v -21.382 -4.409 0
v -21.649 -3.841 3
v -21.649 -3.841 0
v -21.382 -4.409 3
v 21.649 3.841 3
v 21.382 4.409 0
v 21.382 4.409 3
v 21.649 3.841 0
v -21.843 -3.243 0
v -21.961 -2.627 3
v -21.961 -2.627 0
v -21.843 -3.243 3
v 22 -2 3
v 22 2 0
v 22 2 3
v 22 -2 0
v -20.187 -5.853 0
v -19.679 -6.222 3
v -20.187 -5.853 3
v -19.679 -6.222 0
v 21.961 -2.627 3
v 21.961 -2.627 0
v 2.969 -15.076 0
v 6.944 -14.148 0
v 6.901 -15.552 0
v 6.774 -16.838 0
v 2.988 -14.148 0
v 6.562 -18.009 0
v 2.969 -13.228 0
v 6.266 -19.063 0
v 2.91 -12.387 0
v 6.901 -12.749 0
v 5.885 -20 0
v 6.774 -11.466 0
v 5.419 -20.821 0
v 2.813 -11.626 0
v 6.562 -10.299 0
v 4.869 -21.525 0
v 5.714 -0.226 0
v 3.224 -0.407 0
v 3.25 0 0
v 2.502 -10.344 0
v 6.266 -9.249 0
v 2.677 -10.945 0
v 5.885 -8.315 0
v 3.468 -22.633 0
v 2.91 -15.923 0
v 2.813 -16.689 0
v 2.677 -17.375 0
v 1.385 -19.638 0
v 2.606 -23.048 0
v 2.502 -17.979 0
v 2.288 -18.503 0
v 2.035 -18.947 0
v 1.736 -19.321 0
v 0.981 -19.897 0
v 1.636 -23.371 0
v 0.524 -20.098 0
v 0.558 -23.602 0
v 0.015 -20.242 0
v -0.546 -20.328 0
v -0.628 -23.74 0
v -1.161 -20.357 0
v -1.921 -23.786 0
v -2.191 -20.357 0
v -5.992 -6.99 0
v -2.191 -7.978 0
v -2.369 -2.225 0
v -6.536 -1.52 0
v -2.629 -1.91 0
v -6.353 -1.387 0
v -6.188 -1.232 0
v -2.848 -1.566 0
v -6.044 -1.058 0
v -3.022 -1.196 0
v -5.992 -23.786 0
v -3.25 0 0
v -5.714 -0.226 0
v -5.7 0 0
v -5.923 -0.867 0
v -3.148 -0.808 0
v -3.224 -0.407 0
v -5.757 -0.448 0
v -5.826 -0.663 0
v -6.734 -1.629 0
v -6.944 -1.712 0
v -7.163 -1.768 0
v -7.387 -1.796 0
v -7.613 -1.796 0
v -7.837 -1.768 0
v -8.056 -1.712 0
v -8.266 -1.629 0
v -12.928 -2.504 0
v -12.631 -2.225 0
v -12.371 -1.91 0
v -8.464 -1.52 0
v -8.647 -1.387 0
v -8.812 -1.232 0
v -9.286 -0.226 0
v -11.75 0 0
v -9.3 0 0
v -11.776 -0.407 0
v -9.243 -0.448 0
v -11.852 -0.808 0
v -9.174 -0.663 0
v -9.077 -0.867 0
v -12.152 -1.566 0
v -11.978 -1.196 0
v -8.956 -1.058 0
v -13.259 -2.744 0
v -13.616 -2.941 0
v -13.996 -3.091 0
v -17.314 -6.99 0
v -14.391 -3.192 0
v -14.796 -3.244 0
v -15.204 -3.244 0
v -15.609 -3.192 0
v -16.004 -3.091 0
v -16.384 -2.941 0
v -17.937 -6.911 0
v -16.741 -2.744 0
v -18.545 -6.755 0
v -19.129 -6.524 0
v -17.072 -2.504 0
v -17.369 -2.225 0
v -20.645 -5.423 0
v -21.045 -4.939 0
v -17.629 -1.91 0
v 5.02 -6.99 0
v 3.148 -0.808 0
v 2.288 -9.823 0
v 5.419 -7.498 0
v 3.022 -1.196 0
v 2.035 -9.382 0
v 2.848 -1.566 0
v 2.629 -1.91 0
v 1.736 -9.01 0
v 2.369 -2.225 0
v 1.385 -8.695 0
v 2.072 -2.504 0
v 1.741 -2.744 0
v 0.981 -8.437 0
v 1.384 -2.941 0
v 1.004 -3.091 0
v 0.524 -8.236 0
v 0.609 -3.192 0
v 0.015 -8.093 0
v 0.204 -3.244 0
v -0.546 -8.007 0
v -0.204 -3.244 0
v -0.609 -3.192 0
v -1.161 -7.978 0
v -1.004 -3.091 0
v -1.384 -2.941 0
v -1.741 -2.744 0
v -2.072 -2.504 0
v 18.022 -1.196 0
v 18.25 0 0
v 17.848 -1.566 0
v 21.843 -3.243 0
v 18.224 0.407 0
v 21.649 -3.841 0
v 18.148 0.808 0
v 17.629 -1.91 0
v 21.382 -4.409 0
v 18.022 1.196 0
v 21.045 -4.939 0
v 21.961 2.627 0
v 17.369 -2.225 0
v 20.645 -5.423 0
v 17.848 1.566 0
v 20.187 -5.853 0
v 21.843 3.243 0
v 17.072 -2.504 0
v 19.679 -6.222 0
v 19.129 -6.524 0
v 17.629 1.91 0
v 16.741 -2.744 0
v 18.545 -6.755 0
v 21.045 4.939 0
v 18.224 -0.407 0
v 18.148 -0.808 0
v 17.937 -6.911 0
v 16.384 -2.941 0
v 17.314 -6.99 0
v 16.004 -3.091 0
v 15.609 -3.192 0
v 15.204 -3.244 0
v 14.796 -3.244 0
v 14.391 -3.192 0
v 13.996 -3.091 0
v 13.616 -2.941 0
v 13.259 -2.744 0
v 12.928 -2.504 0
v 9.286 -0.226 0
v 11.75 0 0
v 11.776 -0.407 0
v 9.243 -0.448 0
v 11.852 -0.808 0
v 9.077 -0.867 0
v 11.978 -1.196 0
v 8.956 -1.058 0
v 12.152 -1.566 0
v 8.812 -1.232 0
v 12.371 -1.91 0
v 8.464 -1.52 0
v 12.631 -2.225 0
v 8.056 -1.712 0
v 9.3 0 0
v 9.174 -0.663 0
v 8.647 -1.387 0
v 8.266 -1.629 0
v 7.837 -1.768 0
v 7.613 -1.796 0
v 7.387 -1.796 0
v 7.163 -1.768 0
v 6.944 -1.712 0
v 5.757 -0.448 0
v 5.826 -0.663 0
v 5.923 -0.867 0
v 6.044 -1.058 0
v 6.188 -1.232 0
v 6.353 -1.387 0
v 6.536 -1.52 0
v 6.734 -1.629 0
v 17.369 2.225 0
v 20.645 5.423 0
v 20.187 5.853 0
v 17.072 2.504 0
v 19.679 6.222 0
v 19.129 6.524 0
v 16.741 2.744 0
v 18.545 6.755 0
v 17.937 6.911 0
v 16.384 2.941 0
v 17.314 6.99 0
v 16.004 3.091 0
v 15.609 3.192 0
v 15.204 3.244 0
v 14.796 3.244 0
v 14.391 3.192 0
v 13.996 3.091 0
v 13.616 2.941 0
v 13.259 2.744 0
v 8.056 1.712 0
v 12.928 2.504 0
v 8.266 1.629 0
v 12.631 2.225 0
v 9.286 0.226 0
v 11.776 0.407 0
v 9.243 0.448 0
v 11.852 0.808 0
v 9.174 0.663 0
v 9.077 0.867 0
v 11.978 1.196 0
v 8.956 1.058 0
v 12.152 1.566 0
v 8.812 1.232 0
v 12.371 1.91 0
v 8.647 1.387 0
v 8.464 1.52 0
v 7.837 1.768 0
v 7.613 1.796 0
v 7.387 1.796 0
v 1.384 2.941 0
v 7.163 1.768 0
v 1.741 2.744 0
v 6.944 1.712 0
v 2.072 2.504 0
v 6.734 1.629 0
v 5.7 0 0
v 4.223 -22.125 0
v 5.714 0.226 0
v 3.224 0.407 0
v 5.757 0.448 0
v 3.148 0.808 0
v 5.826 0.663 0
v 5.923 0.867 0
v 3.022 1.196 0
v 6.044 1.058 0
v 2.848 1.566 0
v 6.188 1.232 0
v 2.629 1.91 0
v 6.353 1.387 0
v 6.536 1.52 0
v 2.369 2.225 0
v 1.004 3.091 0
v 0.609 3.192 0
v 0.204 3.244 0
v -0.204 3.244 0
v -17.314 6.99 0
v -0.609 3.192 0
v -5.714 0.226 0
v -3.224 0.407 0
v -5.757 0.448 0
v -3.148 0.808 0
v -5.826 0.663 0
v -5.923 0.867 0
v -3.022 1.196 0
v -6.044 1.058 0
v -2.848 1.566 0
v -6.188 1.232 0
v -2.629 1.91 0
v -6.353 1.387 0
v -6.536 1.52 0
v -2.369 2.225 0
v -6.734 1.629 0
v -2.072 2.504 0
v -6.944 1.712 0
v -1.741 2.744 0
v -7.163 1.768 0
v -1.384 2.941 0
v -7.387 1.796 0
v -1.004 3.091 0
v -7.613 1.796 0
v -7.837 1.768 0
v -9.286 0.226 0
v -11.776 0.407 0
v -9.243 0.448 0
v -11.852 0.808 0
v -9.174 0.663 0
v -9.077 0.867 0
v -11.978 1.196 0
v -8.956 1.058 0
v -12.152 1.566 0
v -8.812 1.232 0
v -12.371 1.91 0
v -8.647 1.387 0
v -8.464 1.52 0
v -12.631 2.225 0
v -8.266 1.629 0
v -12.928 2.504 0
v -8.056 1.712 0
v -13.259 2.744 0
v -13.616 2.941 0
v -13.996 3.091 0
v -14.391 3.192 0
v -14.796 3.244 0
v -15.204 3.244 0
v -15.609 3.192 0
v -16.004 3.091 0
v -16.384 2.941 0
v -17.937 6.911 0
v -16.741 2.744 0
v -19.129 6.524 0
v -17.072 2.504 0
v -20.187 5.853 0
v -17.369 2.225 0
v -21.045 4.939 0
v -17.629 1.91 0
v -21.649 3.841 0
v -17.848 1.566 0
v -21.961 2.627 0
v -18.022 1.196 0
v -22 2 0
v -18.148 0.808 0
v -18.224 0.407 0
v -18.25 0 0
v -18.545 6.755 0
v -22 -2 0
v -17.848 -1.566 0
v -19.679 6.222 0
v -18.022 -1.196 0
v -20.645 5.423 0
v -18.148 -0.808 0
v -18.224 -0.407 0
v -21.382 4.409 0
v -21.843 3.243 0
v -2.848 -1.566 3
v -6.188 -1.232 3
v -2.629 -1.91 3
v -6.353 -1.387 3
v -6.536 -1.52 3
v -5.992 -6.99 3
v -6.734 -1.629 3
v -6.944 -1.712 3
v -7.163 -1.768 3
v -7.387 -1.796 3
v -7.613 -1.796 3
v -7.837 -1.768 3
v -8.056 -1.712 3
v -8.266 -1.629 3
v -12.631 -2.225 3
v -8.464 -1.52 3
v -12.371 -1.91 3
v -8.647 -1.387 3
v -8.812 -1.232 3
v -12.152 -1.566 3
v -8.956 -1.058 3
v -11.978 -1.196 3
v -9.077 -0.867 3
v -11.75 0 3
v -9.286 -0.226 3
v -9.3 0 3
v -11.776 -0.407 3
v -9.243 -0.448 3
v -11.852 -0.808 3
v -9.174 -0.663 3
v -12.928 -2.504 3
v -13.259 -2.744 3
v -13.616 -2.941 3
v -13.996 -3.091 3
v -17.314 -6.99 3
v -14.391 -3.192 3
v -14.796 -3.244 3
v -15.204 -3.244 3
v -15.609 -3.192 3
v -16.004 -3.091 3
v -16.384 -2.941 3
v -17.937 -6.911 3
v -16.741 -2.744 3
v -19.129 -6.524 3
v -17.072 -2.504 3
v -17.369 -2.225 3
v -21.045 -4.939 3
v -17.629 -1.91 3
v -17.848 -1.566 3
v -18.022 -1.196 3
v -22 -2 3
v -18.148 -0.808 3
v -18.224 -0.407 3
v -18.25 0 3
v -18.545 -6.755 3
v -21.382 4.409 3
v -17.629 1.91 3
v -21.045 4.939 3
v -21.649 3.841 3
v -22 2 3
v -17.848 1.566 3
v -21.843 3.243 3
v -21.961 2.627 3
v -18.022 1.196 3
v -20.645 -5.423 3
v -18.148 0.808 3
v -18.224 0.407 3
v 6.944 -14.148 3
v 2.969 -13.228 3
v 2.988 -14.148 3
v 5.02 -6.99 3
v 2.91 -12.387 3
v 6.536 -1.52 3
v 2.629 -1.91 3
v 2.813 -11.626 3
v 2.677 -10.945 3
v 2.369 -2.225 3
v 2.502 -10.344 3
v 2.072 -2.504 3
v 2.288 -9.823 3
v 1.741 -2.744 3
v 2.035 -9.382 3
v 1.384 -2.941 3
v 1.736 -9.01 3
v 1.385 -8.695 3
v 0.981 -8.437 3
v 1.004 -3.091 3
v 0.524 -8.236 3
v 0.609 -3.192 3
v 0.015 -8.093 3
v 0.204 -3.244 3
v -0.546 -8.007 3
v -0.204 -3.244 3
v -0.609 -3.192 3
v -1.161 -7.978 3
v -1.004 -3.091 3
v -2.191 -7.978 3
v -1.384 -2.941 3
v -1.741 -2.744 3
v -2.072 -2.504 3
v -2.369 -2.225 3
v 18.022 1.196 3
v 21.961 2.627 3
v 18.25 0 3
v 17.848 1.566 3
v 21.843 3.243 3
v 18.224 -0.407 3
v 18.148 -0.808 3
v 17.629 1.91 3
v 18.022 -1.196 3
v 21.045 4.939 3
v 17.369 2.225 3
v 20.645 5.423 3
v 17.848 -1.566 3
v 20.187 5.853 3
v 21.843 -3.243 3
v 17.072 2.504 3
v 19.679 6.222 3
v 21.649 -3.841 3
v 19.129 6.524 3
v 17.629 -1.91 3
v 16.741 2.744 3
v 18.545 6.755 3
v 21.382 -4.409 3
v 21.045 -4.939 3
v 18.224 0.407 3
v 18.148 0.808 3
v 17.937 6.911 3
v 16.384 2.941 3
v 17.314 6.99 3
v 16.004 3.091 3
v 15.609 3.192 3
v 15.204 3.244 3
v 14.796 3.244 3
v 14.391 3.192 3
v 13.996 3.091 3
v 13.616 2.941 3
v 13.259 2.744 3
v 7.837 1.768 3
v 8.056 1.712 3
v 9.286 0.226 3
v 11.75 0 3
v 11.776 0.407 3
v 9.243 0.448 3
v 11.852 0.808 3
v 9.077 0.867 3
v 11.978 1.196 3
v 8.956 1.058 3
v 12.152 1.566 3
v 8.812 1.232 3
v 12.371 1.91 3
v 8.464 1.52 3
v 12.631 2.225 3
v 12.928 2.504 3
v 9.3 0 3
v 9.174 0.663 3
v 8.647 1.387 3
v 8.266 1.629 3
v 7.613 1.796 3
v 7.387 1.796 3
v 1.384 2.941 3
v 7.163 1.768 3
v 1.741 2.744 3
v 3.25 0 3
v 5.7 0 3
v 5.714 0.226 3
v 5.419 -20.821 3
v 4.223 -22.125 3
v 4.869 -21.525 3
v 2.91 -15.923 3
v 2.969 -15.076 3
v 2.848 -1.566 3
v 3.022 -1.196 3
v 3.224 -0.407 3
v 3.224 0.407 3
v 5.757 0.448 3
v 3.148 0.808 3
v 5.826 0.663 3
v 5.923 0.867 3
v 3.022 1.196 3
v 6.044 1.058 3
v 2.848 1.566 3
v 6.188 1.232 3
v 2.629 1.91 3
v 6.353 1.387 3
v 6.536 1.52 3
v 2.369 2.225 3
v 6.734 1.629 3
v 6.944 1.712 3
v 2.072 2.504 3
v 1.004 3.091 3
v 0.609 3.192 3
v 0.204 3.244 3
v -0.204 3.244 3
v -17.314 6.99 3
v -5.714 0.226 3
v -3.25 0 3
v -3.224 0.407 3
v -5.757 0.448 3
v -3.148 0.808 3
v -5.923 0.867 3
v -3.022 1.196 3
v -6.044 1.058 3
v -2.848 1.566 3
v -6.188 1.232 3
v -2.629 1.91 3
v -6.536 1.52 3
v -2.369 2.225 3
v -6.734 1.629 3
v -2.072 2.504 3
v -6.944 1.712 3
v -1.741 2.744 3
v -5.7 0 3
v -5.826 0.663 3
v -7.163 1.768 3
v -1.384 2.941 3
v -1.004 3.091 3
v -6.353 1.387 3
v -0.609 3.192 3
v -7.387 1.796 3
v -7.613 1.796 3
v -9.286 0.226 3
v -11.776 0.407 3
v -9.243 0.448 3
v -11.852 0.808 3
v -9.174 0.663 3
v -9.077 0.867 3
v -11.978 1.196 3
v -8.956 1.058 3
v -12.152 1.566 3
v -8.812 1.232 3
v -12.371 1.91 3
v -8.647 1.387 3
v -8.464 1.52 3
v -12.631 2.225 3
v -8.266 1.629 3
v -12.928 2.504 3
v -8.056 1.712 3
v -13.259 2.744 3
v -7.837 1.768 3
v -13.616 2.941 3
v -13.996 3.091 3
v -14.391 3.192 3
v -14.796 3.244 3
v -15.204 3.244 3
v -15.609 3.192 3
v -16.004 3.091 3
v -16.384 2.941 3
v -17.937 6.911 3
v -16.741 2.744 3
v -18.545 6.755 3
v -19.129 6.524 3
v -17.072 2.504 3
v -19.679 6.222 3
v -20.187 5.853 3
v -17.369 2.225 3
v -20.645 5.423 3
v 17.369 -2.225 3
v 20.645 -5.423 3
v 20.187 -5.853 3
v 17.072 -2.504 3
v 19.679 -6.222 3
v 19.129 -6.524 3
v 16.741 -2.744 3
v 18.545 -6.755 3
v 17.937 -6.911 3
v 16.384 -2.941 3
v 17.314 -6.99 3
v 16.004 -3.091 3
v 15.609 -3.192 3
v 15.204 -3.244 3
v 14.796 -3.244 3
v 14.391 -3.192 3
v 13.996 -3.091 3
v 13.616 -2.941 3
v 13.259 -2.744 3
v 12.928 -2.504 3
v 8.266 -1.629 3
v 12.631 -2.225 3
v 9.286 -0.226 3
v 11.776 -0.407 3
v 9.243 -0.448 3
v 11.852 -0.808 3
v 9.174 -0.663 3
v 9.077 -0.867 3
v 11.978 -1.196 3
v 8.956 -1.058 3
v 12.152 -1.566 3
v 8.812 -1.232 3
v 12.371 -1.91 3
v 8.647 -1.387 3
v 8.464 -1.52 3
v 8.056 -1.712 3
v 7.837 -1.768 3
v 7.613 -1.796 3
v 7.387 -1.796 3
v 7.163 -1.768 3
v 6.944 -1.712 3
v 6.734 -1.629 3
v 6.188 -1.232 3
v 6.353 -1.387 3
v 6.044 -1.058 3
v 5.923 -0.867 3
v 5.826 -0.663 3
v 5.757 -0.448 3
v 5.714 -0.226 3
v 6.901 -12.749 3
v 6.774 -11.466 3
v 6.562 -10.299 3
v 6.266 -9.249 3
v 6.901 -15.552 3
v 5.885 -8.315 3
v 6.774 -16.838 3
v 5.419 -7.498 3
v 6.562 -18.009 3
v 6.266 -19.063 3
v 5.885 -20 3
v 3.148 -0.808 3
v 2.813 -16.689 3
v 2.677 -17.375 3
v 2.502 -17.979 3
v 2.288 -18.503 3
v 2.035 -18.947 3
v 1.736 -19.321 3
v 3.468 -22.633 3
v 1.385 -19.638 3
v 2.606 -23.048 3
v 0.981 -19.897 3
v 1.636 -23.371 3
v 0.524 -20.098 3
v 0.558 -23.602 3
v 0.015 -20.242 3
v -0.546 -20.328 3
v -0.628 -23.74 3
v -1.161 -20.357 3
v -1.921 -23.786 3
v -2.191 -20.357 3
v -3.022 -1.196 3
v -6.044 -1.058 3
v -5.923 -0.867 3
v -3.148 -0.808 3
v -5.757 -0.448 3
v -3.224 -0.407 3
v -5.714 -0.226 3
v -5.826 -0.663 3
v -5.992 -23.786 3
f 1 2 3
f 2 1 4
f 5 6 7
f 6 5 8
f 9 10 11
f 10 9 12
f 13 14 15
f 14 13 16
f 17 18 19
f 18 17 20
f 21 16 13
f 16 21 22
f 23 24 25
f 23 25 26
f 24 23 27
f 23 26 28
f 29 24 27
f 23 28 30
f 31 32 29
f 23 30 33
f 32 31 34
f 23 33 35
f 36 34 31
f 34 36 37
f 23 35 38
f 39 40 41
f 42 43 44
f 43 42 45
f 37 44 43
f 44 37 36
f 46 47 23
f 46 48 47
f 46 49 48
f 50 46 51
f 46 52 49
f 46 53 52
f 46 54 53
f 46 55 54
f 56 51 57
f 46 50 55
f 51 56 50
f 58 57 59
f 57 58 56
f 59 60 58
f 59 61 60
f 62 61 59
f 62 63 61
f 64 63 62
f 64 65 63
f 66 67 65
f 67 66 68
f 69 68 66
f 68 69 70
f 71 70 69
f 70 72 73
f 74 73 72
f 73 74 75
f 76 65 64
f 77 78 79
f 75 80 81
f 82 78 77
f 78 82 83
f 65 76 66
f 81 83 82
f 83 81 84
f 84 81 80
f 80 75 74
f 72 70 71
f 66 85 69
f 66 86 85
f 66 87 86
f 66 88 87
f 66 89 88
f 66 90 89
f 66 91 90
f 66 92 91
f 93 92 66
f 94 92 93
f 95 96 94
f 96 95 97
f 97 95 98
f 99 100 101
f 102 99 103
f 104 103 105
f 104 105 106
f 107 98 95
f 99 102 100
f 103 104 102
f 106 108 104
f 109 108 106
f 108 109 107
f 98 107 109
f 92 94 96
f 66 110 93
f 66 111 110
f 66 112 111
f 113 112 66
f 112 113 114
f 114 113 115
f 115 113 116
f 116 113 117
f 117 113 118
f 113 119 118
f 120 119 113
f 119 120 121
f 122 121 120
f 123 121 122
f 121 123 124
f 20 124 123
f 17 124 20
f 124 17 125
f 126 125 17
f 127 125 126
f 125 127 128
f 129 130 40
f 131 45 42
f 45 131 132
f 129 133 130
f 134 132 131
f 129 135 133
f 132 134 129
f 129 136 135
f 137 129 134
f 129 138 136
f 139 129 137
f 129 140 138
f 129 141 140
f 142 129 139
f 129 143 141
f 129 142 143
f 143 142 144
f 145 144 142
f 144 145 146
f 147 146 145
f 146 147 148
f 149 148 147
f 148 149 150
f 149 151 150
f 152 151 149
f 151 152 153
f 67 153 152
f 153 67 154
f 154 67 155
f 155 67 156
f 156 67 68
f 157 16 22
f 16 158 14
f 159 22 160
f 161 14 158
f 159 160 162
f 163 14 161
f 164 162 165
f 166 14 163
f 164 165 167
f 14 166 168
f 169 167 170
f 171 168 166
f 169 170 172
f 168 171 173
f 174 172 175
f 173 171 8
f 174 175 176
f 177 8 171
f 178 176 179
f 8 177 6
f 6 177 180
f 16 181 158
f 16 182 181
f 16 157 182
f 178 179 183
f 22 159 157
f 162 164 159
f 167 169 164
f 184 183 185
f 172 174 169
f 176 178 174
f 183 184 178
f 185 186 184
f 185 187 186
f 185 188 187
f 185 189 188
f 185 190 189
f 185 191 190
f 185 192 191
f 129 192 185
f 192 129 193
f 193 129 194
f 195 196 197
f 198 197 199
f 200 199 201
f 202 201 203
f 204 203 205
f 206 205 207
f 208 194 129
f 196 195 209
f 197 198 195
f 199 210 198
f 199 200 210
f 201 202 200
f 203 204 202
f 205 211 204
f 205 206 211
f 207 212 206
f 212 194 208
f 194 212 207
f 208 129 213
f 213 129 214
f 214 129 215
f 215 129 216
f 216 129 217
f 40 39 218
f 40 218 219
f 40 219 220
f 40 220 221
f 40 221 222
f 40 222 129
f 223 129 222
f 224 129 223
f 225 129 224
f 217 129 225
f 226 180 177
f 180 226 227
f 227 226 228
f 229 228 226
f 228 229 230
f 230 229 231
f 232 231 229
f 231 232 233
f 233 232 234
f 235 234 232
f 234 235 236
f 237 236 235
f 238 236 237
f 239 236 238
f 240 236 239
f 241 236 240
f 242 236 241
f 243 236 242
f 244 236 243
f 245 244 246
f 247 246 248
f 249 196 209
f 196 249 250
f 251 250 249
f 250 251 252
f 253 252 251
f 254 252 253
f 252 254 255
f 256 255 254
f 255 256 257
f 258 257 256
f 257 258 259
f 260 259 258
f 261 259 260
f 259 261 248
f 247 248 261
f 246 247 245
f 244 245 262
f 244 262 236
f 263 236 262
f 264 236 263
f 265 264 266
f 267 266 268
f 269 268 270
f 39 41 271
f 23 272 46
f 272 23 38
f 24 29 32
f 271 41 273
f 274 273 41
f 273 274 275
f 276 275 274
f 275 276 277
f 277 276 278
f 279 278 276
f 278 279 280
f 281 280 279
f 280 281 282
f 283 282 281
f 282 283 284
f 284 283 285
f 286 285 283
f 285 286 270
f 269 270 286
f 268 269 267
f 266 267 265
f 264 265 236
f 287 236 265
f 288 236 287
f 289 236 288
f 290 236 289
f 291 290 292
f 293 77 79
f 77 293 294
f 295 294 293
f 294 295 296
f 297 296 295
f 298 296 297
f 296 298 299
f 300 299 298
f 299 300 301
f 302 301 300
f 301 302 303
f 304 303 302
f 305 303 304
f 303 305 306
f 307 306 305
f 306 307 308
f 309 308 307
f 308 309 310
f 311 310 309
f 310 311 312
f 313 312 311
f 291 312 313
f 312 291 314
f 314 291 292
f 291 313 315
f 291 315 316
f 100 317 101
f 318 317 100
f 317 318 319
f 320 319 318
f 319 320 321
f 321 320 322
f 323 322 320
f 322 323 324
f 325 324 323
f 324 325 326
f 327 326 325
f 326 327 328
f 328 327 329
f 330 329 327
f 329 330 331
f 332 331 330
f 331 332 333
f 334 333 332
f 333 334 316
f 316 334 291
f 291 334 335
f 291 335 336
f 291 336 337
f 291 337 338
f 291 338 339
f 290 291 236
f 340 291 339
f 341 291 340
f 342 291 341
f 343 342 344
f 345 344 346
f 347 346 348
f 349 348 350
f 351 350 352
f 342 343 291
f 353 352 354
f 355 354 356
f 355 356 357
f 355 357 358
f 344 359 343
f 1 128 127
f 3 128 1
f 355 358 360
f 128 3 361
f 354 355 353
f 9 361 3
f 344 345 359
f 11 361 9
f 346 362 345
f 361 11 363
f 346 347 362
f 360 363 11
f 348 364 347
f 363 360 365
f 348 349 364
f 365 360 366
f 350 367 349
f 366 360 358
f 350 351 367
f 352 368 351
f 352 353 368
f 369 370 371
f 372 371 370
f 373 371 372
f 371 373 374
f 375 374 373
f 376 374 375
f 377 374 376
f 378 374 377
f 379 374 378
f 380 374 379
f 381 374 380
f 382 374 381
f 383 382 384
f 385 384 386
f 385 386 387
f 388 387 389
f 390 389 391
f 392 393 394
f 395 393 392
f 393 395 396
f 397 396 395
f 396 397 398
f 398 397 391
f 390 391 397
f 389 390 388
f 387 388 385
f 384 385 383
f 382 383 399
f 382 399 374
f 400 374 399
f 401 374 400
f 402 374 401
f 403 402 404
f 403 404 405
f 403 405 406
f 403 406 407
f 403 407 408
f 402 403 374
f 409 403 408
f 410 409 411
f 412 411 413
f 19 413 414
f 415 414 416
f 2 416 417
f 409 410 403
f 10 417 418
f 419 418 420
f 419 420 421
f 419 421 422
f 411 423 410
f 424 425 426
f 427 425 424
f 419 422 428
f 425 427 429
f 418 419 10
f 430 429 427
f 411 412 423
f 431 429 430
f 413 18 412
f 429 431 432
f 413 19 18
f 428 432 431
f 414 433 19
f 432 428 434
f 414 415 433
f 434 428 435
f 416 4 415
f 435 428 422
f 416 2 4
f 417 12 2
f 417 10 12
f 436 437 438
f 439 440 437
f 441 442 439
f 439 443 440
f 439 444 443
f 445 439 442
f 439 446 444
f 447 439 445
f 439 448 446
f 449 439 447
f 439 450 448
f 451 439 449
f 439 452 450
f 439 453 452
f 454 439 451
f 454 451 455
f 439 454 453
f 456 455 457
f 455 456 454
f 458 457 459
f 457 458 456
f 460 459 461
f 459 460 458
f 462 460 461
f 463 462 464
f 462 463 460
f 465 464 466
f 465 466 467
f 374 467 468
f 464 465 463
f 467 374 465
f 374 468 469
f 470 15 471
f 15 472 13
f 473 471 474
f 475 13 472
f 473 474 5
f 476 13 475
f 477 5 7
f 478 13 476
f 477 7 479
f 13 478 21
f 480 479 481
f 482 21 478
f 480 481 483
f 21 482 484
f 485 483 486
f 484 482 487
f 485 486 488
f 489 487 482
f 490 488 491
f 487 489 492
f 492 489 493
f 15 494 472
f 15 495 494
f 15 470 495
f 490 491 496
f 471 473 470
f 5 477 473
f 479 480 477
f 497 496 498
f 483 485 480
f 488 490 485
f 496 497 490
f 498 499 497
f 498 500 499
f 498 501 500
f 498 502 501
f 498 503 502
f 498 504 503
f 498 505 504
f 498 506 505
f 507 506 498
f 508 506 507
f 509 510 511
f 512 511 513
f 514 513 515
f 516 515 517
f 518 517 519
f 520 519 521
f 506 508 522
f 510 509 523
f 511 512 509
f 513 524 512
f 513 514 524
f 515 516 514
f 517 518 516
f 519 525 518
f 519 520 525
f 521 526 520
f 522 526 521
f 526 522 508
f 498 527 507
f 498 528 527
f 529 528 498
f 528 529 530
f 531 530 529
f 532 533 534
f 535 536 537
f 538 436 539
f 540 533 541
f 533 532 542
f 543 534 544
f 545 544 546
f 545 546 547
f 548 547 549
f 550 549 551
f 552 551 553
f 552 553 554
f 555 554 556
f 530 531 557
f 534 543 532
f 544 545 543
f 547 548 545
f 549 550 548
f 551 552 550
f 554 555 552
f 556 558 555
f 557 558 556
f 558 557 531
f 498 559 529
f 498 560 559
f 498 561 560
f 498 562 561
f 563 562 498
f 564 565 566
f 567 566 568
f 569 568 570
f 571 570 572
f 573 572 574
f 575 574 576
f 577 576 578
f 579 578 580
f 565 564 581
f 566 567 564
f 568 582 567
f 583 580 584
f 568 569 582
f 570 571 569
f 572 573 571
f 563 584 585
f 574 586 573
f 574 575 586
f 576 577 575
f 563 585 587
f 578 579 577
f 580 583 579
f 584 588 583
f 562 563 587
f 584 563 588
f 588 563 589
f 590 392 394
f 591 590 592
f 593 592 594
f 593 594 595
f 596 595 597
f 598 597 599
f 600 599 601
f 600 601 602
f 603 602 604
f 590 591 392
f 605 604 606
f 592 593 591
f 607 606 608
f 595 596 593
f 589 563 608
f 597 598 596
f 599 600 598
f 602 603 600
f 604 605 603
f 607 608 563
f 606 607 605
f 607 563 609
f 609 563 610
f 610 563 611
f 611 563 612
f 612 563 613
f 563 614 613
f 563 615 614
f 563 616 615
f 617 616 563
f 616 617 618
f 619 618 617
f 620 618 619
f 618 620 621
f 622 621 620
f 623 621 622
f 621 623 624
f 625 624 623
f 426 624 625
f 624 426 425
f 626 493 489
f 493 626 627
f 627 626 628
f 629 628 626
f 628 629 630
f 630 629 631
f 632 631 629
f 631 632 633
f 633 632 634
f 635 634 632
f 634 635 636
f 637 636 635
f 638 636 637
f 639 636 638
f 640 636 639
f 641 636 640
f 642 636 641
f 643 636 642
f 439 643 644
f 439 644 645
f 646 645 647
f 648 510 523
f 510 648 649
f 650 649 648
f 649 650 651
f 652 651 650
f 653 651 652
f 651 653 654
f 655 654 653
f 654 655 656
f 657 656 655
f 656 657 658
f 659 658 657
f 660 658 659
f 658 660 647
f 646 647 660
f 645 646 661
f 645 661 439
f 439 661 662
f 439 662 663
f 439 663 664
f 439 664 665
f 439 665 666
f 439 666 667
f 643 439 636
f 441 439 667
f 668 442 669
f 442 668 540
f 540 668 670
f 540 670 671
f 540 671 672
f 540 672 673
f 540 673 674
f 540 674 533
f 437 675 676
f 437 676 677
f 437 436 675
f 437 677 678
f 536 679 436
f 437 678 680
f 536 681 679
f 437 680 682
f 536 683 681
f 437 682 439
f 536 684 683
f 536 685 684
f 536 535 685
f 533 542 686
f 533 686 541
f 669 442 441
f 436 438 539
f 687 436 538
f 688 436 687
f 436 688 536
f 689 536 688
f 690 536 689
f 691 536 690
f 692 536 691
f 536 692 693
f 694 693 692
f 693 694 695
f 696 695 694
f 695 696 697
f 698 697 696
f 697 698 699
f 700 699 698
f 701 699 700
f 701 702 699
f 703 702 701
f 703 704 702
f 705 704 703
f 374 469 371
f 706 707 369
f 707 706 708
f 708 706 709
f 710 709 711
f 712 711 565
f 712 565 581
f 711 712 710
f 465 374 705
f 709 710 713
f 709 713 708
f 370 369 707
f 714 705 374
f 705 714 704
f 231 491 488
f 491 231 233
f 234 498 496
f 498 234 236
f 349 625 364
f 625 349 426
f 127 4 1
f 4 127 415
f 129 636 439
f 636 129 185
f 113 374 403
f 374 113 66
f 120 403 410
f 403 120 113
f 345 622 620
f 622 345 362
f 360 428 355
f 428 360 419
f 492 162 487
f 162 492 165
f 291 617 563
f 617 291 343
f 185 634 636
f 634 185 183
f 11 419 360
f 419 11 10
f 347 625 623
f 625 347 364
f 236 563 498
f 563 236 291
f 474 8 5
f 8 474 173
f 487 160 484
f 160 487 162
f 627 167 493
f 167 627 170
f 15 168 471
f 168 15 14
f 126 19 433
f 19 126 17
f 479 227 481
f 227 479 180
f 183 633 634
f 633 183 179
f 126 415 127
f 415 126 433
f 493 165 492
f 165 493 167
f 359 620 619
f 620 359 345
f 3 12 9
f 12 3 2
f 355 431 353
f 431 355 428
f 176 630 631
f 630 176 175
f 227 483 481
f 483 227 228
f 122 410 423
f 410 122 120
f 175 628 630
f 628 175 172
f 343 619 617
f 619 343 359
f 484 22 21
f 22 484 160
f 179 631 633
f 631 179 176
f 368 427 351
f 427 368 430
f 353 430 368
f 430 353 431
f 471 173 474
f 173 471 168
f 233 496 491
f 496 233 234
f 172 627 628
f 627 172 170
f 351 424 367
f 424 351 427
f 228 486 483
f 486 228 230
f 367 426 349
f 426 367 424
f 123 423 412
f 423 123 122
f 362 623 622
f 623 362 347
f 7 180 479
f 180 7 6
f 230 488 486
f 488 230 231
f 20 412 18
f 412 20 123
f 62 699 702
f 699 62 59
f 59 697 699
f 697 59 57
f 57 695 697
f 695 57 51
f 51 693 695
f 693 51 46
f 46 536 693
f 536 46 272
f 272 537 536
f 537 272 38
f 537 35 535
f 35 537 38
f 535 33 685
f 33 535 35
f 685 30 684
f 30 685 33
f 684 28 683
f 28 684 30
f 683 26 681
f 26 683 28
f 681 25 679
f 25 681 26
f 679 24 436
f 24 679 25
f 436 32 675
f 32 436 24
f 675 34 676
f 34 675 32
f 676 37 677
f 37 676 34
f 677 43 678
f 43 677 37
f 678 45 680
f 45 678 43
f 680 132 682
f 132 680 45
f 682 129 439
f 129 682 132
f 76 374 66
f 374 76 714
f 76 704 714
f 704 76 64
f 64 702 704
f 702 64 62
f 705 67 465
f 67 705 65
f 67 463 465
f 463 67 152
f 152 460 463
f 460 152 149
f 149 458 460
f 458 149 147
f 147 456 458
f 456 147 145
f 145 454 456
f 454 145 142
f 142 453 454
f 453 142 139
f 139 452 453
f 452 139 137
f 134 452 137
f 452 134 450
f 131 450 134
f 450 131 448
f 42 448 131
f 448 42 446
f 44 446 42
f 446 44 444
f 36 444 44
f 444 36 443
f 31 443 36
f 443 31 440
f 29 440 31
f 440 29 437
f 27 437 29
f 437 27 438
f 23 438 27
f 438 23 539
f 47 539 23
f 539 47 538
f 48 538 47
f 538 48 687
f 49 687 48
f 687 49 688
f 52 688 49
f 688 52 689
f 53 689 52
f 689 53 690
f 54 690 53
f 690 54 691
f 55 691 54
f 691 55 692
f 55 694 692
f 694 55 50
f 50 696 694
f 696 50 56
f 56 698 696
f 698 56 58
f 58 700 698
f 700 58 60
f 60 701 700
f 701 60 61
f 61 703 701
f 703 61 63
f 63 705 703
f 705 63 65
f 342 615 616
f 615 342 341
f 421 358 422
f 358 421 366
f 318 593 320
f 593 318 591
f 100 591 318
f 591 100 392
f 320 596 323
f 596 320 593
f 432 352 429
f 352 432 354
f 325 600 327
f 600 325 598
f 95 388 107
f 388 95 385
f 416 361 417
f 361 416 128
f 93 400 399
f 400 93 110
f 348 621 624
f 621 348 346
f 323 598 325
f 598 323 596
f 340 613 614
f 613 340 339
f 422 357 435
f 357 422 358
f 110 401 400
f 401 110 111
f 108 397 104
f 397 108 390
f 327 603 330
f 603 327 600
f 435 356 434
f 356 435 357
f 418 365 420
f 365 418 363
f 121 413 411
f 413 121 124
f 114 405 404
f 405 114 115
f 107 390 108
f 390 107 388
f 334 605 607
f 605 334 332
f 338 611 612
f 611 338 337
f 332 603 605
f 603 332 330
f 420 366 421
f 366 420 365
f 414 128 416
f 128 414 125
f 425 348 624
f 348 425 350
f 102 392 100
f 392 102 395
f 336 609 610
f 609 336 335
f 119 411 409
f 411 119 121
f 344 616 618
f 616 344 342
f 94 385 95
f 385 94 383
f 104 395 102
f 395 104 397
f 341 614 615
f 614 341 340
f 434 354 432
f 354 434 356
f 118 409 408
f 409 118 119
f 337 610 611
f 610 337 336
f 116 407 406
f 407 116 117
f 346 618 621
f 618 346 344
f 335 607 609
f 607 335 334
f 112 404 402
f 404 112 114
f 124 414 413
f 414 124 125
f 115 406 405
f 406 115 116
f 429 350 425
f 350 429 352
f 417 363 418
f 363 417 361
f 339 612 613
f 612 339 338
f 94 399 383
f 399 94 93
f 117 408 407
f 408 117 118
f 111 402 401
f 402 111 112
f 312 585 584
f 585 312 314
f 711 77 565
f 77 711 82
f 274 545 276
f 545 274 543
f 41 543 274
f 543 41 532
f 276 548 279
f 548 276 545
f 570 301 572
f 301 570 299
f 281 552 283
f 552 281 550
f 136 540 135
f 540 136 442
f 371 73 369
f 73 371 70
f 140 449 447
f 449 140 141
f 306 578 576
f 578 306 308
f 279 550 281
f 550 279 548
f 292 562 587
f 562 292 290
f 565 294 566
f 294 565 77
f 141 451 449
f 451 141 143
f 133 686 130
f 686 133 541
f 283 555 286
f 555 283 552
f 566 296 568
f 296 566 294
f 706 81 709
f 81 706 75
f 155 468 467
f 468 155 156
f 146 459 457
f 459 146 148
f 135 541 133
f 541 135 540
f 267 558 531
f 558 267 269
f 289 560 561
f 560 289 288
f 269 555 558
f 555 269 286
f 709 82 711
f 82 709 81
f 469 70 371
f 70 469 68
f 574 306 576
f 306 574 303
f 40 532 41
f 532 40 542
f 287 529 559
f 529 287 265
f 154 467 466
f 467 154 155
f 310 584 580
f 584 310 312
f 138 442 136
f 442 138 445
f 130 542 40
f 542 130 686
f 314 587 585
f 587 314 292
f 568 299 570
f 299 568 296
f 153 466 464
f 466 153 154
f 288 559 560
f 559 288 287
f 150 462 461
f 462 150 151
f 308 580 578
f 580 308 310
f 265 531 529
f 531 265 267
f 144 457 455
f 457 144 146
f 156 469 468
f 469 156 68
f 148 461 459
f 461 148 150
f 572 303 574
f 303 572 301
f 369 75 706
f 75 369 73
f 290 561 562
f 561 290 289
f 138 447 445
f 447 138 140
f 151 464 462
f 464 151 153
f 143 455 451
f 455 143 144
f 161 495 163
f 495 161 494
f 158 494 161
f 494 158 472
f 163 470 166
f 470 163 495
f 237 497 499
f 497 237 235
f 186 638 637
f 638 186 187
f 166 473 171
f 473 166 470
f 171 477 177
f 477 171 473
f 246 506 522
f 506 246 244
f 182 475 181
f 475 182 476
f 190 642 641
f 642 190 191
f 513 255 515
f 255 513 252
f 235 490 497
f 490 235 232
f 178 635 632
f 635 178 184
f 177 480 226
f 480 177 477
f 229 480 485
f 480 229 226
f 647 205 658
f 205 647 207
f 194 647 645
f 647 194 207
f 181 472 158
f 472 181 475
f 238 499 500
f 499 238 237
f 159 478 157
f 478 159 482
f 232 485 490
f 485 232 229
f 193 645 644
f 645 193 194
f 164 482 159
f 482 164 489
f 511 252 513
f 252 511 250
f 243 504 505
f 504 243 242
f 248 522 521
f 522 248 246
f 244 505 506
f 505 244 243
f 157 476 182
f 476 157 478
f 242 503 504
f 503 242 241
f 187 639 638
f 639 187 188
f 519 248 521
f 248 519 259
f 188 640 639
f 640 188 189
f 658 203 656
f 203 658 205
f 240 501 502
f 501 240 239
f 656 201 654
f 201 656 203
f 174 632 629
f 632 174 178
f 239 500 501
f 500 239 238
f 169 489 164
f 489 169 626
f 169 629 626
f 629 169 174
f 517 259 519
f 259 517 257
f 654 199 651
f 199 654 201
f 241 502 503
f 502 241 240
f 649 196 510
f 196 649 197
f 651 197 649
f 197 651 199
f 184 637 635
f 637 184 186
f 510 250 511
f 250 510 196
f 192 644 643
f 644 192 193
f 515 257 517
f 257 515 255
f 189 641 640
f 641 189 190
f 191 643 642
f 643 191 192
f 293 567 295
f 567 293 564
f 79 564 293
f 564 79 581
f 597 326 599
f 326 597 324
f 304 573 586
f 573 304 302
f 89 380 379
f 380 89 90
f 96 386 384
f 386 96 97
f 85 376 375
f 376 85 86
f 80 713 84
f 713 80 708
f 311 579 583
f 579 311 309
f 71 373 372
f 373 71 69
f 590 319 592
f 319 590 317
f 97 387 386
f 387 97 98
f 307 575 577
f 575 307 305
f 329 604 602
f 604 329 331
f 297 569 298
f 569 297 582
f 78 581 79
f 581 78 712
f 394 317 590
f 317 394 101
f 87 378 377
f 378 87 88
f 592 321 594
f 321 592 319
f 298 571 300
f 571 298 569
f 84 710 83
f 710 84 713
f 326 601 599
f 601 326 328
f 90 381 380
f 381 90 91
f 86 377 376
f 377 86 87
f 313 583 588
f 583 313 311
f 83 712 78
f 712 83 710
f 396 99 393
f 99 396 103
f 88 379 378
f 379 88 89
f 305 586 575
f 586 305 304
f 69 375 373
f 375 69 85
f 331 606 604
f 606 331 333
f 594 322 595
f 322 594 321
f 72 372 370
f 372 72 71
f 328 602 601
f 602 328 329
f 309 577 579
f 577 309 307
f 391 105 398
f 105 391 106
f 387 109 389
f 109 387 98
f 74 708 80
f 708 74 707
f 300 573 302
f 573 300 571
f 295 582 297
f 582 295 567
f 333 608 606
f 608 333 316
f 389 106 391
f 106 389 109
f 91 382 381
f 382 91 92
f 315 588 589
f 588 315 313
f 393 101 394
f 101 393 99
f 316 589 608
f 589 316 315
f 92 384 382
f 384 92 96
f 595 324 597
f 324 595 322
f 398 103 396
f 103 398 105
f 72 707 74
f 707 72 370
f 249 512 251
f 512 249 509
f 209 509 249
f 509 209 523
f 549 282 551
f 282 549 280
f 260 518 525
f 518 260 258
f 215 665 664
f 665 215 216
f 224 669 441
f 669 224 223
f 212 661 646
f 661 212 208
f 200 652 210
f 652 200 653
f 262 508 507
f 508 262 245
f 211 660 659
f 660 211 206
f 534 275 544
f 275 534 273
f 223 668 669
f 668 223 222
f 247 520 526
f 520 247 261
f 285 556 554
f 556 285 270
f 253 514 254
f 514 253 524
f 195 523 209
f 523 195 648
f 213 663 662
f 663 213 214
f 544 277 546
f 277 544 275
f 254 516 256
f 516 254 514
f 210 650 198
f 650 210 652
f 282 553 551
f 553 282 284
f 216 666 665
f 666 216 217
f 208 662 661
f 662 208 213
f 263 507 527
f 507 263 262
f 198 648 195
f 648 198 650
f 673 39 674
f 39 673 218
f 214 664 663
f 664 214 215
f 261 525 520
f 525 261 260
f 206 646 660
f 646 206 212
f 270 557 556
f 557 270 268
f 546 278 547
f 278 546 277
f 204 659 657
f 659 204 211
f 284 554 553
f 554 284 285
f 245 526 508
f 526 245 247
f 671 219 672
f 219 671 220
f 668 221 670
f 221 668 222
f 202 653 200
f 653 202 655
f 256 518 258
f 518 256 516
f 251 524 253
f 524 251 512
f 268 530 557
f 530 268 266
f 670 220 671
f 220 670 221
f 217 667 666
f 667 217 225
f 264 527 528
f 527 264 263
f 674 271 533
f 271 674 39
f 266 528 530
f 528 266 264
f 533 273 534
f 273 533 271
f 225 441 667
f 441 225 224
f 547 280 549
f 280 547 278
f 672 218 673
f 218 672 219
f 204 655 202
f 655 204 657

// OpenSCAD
$fn = 50;


difference() {
	union() {
		hull() {
			translate(v = [-17.0000000000, 2.0000000000, 0]) {
				cylinder(h = 3, r = 5);
			}
			translate(v = [17.0000000000, 2.0000000000, 0]) {
				cylinder(h = 3, r = 5);
			}
			translate(v = [-17.0000000000, -2.0000000000, 0]) {
				cylinder(h = 3, r = 5);
			}
			translate(v = [17.0000000000, -2.0000000000, 0]) {
				cylinder(h = 3, r = 5);
			}
		}
		translate(v = [0, -5, 0]) {
			linear_extrude(height = 3) {
				text(font = "DejaVu Sans Mono:style=Bold", halign = "center", size = 19.0000000000, text = "D", valign = "top");
			}
		}
	}
	union() {
		translate(v = [-15.0000000000, 0.0000000000, 0]) {
			translate(v = [0, 0, -100]) {
				cylinder(h = 200, r = 3.2500000000);
			}
		}
		translate(v = [0, 0, -100]) {
			cylinder(h = 200, r = 3.2500000000);
		}
		translate(v = [15.0000000000, 0.0000000000, 0]) {
			translate(v = [0, 0, -100]) {
				cylinder(h = 200, r = 3.2500000000);
			}
		}
		translate(v = [-15.0000000000, 0.0000000000, 0]) {
			translate(v = [0, 0, -100]) {
				cylinder(h = 200, r = 1.8000000000);
			}
		}
		translate(v = [-7.5000000000, 0.0000000000, 0]) {
			translate(v = [0, 0, -100]) {
				cylinder(h = 200, r = 1.8000000000);
			}
		}
		translate(v = [0, 0, -100]) {
			cylinder(h = 200, r = 1.8000000000);
		}
		translate(v = [7.5000000000, 0.0000000000, 0]) {
			translate(v = [0, 0, -100]) {
				cylinder(h = 200, r = 1.8000000000);
			}
		}
		translate(v = [15.0000000000, 0.0000000000, 0]) {
			translate(v = [0, 0, -100]) {
				cylinder(h = 200, r = 1.8000000000);
			}
		}
	}
}
